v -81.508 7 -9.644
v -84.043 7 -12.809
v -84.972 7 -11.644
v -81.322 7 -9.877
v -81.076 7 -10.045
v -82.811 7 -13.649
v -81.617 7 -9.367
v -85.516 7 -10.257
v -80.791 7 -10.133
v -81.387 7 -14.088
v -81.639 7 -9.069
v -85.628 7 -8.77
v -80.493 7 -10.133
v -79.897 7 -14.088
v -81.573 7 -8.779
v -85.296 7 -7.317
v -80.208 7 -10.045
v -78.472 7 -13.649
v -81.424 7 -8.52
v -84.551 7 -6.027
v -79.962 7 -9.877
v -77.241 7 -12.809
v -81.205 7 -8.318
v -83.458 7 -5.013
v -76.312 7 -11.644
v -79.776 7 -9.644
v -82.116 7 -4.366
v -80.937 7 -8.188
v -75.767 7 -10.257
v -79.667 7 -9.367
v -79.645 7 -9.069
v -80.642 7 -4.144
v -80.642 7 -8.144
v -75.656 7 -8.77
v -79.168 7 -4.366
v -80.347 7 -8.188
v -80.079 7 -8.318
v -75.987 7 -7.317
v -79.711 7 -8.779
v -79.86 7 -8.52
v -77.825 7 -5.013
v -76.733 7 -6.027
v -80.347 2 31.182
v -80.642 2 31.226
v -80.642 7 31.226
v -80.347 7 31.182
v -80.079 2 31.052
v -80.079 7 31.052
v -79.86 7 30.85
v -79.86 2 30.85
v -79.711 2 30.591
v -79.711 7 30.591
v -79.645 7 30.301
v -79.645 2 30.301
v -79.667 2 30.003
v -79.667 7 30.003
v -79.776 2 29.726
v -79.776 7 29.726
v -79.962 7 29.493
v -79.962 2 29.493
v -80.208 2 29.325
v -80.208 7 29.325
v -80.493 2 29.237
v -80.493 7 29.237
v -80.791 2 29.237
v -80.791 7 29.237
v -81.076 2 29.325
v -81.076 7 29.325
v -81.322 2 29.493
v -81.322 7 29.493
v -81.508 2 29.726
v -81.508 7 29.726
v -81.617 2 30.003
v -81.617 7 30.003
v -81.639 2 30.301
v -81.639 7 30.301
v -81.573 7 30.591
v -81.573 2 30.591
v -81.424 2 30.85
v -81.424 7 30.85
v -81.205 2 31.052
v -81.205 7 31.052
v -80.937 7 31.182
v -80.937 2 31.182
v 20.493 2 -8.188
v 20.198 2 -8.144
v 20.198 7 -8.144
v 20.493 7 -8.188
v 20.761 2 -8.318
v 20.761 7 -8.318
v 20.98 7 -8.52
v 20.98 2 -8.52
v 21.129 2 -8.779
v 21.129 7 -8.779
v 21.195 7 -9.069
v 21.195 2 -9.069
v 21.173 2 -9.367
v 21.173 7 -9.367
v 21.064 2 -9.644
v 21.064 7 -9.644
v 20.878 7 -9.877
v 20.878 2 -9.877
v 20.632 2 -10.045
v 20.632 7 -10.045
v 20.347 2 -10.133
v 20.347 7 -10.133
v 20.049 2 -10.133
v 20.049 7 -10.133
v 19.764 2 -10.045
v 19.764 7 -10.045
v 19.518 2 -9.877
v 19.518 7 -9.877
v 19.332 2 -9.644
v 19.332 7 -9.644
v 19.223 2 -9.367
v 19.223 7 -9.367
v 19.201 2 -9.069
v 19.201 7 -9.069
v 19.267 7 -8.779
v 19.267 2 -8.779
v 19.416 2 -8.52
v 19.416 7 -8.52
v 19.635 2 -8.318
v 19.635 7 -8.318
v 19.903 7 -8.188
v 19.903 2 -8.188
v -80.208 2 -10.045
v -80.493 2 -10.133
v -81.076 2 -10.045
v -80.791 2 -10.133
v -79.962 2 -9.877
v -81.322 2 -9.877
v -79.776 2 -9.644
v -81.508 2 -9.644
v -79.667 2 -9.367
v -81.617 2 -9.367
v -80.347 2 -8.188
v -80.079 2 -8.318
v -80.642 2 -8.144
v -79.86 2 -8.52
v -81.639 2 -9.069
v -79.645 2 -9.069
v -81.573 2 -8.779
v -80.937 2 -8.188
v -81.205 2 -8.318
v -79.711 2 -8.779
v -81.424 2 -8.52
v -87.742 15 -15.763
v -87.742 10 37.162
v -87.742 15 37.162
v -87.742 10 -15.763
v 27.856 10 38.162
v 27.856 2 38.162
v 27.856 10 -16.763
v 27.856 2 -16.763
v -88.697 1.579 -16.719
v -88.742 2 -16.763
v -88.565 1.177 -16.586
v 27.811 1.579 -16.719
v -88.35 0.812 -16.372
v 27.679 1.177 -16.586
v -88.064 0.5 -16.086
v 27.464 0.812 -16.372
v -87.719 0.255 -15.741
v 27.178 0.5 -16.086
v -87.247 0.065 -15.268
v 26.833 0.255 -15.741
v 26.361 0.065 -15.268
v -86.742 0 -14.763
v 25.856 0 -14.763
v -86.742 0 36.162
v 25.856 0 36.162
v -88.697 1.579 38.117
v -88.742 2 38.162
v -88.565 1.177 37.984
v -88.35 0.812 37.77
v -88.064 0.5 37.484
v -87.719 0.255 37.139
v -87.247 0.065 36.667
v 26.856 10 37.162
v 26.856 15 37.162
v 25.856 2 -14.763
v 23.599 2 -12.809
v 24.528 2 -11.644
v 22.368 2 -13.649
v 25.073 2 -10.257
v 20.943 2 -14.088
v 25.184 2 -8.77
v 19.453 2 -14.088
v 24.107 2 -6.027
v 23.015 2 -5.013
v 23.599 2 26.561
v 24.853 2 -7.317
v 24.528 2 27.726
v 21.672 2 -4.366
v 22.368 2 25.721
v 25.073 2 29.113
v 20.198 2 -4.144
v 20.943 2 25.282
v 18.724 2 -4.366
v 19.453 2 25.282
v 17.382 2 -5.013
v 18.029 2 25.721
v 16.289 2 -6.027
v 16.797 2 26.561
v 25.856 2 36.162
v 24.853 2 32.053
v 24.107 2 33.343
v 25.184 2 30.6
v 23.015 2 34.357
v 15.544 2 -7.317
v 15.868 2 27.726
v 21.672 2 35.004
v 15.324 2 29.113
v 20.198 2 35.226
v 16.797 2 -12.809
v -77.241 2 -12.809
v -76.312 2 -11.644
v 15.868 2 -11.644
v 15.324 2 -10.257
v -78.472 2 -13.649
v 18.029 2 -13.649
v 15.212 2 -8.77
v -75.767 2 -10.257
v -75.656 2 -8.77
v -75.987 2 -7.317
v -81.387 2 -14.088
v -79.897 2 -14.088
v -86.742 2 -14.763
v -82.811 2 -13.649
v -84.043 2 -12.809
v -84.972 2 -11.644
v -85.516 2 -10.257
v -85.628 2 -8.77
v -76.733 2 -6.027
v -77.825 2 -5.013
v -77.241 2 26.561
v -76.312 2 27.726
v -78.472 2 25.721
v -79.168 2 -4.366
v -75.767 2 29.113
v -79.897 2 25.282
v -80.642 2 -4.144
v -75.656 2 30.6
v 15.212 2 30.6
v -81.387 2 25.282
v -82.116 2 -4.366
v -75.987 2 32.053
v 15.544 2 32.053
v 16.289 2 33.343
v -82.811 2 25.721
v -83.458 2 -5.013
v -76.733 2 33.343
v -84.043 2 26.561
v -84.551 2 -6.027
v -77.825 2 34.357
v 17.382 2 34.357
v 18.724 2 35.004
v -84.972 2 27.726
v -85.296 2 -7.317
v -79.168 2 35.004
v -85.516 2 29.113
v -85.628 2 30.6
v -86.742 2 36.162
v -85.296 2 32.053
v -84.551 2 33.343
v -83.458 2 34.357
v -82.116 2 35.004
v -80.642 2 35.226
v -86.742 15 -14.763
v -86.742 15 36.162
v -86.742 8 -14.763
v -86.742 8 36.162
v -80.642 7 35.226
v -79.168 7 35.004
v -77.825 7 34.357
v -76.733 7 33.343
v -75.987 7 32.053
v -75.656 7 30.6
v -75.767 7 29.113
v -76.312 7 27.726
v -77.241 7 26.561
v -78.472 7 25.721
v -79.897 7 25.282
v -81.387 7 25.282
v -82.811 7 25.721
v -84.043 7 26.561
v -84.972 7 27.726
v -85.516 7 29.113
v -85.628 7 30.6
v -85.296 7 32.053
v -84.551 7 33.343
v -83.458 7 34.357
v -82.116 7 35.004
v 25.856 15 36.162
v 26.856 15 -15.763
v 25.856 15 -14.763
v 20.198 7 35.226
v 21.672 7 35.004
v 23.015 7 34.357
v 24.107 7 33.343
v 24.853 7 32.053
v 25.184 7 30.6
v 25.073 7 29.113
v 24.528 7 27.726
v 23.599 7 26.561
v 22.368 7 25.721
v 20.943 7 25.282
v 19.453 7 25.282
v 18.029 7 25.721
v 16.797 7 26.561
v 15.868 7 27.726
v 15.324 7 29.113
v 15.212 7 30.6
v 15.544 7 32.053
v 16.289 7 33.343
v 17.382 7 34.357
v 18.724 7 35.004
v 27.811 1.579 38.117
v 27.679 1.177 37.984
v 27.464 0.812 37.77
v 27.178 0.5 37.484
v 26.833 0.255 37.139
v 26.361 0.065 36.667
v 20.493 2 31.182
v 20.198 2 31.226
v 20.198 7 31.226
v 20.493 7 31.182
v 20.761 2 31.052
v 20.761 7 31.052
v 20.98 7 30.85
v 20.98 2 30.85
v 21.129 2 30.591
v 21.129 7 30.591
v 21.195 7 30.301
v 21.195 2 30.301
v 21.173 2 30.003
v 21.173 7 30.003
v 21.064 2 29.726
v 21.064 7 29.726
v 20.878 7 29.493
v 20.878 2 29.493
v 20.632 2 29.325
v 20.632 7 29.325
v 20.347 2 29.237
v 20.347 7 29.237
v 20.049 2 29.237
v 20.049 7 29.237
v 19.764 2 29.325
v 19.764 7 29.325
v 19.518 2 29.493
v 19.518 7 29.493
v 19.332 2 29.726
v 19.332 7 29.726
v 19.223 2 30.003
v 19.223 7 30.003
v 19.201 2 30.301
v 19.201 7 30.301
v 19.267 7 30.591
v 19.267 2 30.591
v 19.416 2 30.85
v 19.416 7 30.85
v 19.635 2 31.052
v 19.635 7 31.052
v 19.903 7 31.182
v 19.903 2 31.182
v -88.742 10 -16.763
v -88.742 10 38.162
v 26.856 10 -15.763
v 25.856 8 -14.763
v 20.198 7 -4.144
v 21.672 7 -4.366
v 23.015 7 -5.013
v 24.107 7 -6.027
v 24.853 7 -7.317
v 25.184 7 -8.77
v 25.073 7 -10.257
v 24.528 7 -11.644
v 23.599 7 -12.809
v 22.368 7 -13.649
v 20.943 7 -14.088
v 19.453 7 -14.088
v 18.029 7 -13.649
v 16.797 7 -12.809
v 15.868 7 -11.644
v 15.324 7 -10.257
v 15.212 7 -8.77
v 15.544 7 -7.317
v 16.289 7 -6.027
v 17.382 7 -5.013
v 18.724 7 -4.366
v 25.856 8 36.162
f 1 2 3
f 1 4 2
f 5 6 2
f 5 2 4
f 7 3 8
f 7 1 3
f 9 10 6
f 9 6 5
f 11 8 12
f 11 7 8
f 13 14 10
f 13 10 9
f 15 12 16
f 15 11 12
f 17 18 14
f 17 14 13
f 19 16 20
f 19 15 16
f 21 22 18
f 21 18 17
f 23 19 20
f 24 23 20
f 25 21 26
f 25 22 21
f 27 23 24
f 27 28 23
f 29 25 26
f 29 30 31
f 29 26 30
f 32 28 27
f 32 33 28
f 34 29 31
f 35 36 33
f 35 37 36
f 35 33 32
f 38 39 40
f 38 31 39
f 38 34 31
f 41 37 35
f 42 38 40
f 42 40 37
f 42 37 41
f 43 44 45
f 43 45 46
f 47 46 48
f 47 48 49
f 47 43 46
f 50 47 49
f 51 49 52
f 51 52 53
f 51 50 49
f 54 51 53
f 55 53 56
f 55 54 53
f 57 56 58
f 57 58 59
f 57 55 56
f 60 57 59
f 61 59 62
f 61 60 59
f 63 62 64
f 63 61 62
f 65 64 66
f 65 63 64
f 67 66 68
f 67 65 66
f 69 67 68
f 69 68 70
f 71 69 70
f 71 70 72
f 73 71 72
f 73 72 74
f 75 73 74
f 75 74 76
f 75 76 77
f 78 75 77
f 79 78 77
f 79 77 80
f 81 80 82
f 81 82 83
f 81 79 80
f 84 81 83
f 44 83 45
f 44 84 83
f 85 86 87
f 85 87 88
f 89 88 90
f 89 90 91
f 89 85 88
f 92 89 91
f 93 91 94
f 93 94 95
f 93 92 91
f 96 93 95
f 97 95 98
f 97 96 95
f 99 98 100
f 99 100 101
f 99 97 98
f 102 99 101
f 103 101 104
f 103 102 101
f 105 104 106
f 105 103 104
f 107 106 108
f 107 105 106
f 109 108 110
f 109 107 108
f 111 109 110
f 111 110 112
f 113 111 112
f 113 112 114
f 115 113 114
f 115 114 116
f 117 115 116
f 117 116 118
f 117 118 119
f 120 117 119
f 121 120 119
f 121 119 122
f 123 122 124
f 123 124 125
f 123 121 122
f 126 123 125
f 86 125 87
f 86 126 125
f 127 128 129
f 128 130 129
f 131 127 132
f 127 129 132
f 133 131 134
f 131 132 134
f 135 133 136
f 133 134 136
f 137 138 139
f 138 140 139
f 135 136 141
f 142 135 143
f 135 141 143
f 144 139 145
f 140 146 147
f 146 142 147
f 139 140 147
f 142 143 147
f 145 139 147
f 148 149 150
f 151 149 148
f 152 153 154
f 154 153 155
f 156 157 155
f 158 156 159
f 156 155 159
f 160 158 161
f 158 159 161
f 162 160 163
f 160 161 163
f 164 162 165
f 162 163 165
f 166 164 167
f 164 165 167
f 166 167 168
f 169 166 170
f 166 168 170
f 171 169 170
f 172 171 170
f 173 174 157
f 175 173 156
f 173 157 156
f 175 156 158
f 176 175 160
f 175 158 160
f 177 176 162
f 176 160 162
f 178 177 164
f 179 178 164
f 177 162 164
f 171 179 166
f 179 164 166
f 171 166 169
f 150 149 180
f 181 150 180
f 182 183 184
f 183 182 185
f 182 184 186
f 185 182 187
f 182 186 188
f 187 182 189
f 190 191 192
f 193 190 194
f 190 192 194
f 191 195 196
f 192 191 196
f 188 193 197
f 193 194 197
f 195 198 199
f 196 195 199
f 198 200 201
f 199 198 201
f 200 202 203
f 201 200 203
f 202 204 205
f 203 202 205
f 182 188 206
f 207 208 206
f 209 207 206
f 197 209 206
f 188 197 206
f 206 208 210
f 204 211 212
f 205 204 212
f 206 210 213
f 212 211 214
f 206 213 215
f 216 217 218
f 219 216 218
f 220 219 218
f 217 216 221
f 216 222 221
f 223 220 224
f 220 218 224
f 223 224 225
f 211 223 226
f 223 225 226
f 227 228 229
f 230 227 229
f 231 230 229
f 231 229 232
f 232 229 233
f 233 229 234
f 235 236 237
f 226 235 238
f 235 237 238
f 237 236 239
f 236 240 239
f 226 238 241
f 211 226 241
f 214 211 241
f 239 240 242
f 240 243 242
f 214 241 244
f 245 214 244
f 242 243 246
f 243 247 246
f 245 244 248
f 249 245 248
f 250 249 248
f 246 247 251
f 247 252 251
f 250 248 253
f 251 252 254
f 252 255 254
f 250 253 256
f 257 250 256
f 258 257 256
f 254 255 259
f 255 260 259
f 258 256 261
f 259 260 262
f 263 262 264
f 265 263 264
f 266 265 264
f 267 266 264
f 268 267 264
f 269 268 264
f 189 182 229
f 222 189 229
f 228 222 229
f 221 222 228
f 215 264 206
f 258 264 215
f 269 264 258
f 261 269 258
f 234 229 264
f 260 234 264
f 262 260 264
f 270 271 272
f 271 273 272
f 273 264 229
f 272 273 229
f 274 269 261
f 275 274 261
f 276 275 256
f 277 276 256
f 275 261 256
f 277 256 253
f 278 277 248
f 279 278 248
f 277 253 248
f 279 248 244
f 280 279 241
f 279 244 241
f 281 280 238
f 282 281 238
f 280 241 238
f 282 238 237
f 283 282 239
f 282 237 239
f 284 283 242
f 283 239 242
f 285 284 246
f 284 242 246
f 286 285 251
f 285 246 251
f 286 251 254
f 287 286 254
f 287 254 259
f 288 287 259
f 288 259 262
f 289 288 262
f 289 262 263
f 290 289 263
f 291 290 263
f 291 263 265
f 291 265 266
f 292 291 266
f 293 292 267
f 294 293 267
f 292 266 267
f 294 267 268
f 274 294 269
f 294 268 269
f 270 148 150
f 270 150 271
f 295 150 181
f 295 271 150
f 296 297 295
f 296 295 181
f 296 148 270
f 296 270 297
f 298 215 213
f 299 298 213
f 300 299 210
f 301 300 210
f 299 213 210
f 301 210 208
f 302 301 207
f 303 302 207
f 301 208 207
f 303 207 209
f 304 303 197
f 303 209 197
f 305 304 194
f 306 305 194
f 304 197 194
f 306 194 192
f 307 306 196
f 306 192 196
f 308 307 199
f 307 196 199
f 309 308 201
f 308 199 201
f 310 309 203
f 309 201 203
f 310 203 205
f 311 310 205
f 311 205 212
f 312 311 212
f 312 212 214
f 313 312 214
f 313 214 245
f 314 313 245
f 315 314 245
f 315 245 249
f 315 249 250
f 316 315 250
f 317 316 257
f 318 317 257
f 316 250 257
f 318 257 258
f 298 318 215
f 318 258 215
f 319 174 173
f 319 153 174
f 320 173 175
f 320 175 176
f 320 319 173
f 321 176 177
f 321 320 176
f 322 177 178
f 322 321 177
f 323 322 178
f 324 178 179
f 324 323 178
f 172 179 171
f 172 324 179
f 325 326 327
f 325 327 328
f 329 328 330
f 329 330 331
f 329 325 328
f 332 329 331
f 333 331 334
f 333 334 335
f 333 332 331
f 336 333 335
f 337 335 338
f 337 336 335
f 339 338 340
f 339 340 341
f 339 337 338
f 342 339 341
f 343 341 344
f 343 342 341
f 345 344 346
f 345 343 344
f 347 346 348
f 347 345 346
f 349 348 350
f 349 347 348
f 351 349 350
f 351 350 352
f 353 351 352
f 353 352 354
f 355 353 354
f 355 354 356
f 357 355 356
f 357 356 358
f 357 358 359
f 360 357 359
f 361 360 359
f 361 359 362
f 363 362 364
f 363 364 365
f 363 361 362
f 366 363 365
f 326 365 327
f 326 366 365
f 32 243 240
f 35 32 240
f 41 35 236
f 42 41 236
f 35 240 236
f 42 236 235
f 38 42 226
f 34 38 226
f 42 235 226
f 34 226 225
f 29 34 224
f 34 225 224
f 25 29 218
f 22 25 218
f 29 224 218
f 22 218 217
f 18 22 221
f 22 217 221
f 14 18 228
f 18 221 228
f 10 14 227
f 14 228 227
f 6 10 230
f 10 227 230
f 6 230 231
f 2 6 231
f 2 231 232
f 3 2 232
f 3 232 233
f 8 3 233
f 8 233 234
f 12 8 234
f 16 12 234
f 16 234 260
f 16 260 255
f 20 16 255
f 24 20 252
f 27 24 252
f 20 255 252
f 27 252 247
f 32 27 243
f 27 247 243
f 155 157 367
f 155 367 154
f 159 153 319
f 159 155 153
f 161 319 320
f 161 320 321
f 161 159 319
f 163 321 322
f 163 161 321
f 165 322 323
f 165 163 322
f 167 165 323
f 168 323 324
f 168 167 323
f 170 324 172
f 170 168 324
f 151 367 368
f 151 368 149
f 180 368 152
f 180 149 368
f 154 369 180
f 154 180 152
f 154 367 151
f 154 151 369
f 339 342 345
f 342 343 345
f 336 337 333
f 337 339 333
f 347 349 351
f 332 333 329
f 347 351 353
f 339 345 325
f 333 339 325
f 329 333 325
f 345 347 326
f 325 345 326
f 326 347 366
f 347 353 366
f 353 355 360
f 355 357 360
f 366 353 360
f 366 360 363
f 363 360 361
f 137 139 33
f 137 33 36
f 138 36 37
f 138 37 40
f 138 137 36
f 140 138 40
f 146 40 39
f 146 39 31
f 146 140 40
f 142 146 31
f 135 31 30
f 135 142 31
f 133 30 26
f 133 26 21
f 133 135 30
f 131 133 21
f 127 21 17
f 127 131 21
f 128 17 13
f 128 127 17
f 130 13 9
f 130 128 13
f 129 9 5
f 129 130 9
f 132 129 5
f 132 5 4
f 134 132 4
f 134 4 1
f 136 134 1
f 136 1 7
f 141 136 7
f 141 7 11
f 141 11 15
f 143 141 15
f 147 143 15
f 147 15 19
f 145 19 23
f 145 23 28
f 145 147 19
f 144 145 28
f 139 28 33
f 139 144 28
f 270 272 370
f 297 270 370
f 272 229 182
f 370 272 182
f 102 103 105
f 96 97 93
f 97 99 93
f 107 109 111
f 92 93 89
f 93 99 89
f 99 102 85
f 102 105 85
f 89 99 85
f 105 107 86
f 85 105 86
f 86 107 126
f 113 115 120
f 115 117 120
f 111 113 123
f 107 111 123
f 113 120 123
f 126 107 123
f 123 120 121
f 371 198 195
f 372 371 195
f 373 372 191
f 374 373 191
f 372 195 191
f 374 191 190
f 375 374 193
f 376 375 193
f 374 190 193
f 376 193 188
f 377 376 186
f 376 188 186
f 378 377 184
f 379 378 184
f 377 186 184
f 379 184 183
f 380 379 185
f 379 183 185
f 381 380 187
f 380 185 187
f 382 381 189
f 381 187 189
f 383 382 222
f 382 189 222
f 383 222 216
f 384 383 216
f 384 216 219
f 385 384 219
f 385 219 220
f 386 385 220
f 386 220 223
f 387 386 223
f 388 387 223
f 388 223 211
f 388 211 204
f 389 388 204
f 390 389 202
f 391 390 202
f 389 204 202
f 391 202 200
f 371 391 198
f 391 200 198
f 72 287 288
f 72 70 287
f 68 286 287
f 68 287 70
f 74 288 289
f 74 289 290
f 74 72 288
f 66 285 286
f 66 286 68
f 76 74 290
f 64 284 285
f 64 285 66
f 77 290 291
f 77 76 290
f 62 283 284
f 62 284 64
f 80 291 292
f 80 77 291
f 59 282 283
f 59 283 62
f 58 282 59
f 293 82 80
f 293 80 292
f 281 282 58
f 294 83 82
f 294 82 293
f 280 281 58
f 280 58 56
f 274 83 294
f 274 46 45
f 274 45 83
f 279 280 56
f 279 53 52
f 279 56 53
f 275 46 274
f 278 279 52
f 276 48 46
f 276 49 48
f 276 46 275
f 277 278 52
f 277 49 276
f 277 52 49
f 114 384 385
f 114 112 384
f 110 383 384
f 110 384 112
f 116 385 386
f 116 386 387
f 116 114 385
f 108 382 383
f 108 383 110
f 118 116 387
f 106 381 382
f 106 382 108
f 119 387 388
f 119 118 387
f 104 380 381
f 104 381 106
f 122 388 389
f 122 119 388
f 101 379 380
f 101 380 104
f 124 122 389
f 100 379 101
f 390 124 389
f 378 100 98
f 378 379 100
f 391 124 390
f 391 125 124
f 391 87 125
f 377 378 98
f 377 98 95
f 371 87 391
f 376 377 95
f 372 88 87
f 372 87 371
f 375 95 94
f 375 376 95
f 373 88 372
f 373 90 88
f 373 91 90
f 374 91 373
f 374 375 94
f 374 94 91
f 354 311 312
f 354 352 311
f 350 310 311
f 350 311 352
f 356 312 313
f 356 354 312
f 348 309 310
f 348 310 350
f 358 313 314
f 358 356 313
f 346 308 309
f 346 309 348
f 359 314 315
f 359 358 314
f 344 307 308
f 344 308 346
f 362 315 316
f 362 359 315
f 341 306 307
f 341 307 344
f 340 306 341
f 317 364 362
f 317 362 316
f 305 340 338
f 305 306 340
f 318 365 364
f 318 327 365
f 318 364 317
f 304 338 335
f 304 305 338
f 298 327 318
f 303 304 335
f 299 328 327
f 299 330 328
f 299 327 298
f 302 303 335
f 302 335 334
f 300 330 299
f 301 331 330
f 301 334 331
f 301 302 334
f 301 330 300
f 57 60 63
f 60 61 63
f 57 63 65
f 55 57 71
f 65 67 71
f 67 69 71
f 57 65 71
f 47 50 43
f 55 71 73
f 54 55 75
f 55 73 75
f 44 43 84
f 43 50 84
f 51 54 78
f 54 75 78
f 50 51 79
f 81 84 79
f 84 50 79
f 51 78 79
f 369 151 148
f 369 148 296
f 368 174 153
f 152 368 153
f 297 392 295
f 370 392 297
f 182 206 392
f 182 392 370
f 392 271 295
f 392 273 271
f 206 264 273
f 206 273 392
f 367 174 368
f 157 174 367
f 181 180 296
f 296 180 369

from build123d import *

# Parameters (mm, degrees)
ESQUISSE1_W             = 116.597430489
ESQUISSE1_H             = 54.924972195
BOSS_EXTRU_1_DEPTH      = 10
CONG_1_R                = 2
COQUE2_START            = -86.741708543
COQUE2_OUTLINE_W        = 6
COQUE2_OUTLINE_H        = 50.924972195
COQUE2_DEPTH            = 112.597430489
ESQUISSE2_W             = 112.597430489
ESQUISSE2_H             = 50.924972195
ENL_V_MAT_EXTRU_2_DEPTH = 2
SUPPORT_VIS_R           = 5
SUPPORT_VIS_R_2         = 1
EX_SUPPORT_DEPTH        = 5
PAROIS_W                = 114.597430489
PAROIS_H                = 52.924972195
PAROIS_W_2              = 112.597430489
PAROIS_H_2              = 50.924972195
EX_PAROIS_DEPTH         = 5


# Read off the part's stored shape, not the designer's step: Coque2
with BuildPart() as part:
    # Esquisse1 → Boss.-Extru.1 (new body)
    with BuildSketch(Plane(origin=(0, 0, 0), x_dir=(1, 0, 0), z_dir=(0, 1, 0))):
        with Locations((-30.442993298, -10.699035797)):
            Rectangle(ESQUISSE1_W, ESQUISSE1_H)
    extrude(amount=BOSS_EXTRU_1_DEPTH)

    # Congé1
    cong_1_edges = [part.edges().sort_by_distance(p)[0] for p in [
        (-30.442993298, 0, -16.7634503),
        (27.855721946, 0, 10.699035797),
        (-30.442993298, 0, 38.161521895),
        (-88.741708543, 0, 10.699035797),
    ]]
    fillet(cong_1_edges, radius=CONG_1_R)

    # Coque2 outline → Coque2 (cut)
    with BuildSketch(Plane.YZ.offset(COQUE2_START)):
        with Locations((5, 10.699035797)):
            Rectangle(COQUE2_OUTLINE_W, COQUE2_OUTLINE_H)
    extrude(amount=COQUE2_DEPTH, mode=Mode.SUBTRACT)

    # Esquisse2 → Enlèv. mat.-Extru.2 (cut)
    with BuildSketch(Plane(origin=(0, 10, 0), x_dir=(1, 0, 0), z_dir=(0, 1, 0))):
        with Locations((-30.442993298, -10.699035797)):
            Rectangle(ESQUISSE2_W, ESQUISSE2_H)
    extrude(amount=-ENL_V_MAT_EXTRU_2_DEPTH, mode=Mode.SUBTRACT)

    # support_vis → ex_support (add)
    # profile 1 of 4: a face of its own
    with BuildSketch(Plane(origin=(0, 2, 0), x_dir=(1, 0, 0), z_dir=(0, 1, 0))):
        with Locations(Location((-80.641833666, 9.143982461, 0), (0, 0, 270))):
            Circle(SUPPORT_VIS_R)
        with Locations(Location((-80.641833666, 9.143982461, 0), (0, 0, 270))):
            Circle(SUPPORT_VIS_R_2, mode=Mode.SUBTRACT)
    # profile 2 of 4: a face of its own
    with BuildSketch(Plane(origin=(0, 2, 0), x_dir=(1, 0, 0), z_dir=(0, 1, 0))):
        with Locations(Location((20.198166334, 9.143982461, 0), (0, 0, 270))):
            Circle(SUPPORT_VIS_R)
        with Locations(Location((20.198166334, 9.143982461, 0), (0, 0, 270))):
            Circle(SUPPORT_VIS_R_2, mode=Mode.SUBTRACT)
    # profile 3 of 4: a face of its own
    with BuildSketch(Plane(origin=(0, 2, 0), x_dir=(1, 0, 0), z_dir=(0, 1, 0))):
        with Locations(Location((-80.641833666, -30.226017539, 0), (0, 0, 270))):
            Circle(SUPPORT_VIS_R)
        with Locations(Location((-80.641833666, -30.226017539, 0), (0, 0, 270))):
            Circle(SUPPORT_VIS_R_2, mode=Mode.SUBTRACT)
    # profile 4 of 4: a face of its own
    with BuildSketch(Plane(origin=(0, 2, 0), x_dir=(1, 0, 0), z_dir=(0, 1, 0))):
        with Locations(Location((20.198166334, -30.226017539, 0), (0, 0, 270))):
            Circle(SUPPORT_VIS_R)
        with Locations(Location((20.198166334, -30.226017539, 0), (0, 0, 270))):
            Circle(SUPPORT_VIS_R_2, mode=Mode.SUBTRACT)
    extrude(amount=EX_SUPPORT_DEPTH)

    # parois → ex_parois (add)
    with BuildSketch(Plane(origin=(0, 10, 0), x_dir=(1, 0, 0), z_dir=(0, 1, 0))):
        with Locations((-30.442993298, -10.699035797)):
            Rectangle(PAROIS_W, PAROIS_H)
        with Locations((-30.442993298, -10.699035797)):
            Rectangle(PAROIS_W_2, PAROIS_H_2, mode=Mode.SUBTRACT)
    extrude(amount=EX_PAROIS_DEPTH)


solid = part.part
